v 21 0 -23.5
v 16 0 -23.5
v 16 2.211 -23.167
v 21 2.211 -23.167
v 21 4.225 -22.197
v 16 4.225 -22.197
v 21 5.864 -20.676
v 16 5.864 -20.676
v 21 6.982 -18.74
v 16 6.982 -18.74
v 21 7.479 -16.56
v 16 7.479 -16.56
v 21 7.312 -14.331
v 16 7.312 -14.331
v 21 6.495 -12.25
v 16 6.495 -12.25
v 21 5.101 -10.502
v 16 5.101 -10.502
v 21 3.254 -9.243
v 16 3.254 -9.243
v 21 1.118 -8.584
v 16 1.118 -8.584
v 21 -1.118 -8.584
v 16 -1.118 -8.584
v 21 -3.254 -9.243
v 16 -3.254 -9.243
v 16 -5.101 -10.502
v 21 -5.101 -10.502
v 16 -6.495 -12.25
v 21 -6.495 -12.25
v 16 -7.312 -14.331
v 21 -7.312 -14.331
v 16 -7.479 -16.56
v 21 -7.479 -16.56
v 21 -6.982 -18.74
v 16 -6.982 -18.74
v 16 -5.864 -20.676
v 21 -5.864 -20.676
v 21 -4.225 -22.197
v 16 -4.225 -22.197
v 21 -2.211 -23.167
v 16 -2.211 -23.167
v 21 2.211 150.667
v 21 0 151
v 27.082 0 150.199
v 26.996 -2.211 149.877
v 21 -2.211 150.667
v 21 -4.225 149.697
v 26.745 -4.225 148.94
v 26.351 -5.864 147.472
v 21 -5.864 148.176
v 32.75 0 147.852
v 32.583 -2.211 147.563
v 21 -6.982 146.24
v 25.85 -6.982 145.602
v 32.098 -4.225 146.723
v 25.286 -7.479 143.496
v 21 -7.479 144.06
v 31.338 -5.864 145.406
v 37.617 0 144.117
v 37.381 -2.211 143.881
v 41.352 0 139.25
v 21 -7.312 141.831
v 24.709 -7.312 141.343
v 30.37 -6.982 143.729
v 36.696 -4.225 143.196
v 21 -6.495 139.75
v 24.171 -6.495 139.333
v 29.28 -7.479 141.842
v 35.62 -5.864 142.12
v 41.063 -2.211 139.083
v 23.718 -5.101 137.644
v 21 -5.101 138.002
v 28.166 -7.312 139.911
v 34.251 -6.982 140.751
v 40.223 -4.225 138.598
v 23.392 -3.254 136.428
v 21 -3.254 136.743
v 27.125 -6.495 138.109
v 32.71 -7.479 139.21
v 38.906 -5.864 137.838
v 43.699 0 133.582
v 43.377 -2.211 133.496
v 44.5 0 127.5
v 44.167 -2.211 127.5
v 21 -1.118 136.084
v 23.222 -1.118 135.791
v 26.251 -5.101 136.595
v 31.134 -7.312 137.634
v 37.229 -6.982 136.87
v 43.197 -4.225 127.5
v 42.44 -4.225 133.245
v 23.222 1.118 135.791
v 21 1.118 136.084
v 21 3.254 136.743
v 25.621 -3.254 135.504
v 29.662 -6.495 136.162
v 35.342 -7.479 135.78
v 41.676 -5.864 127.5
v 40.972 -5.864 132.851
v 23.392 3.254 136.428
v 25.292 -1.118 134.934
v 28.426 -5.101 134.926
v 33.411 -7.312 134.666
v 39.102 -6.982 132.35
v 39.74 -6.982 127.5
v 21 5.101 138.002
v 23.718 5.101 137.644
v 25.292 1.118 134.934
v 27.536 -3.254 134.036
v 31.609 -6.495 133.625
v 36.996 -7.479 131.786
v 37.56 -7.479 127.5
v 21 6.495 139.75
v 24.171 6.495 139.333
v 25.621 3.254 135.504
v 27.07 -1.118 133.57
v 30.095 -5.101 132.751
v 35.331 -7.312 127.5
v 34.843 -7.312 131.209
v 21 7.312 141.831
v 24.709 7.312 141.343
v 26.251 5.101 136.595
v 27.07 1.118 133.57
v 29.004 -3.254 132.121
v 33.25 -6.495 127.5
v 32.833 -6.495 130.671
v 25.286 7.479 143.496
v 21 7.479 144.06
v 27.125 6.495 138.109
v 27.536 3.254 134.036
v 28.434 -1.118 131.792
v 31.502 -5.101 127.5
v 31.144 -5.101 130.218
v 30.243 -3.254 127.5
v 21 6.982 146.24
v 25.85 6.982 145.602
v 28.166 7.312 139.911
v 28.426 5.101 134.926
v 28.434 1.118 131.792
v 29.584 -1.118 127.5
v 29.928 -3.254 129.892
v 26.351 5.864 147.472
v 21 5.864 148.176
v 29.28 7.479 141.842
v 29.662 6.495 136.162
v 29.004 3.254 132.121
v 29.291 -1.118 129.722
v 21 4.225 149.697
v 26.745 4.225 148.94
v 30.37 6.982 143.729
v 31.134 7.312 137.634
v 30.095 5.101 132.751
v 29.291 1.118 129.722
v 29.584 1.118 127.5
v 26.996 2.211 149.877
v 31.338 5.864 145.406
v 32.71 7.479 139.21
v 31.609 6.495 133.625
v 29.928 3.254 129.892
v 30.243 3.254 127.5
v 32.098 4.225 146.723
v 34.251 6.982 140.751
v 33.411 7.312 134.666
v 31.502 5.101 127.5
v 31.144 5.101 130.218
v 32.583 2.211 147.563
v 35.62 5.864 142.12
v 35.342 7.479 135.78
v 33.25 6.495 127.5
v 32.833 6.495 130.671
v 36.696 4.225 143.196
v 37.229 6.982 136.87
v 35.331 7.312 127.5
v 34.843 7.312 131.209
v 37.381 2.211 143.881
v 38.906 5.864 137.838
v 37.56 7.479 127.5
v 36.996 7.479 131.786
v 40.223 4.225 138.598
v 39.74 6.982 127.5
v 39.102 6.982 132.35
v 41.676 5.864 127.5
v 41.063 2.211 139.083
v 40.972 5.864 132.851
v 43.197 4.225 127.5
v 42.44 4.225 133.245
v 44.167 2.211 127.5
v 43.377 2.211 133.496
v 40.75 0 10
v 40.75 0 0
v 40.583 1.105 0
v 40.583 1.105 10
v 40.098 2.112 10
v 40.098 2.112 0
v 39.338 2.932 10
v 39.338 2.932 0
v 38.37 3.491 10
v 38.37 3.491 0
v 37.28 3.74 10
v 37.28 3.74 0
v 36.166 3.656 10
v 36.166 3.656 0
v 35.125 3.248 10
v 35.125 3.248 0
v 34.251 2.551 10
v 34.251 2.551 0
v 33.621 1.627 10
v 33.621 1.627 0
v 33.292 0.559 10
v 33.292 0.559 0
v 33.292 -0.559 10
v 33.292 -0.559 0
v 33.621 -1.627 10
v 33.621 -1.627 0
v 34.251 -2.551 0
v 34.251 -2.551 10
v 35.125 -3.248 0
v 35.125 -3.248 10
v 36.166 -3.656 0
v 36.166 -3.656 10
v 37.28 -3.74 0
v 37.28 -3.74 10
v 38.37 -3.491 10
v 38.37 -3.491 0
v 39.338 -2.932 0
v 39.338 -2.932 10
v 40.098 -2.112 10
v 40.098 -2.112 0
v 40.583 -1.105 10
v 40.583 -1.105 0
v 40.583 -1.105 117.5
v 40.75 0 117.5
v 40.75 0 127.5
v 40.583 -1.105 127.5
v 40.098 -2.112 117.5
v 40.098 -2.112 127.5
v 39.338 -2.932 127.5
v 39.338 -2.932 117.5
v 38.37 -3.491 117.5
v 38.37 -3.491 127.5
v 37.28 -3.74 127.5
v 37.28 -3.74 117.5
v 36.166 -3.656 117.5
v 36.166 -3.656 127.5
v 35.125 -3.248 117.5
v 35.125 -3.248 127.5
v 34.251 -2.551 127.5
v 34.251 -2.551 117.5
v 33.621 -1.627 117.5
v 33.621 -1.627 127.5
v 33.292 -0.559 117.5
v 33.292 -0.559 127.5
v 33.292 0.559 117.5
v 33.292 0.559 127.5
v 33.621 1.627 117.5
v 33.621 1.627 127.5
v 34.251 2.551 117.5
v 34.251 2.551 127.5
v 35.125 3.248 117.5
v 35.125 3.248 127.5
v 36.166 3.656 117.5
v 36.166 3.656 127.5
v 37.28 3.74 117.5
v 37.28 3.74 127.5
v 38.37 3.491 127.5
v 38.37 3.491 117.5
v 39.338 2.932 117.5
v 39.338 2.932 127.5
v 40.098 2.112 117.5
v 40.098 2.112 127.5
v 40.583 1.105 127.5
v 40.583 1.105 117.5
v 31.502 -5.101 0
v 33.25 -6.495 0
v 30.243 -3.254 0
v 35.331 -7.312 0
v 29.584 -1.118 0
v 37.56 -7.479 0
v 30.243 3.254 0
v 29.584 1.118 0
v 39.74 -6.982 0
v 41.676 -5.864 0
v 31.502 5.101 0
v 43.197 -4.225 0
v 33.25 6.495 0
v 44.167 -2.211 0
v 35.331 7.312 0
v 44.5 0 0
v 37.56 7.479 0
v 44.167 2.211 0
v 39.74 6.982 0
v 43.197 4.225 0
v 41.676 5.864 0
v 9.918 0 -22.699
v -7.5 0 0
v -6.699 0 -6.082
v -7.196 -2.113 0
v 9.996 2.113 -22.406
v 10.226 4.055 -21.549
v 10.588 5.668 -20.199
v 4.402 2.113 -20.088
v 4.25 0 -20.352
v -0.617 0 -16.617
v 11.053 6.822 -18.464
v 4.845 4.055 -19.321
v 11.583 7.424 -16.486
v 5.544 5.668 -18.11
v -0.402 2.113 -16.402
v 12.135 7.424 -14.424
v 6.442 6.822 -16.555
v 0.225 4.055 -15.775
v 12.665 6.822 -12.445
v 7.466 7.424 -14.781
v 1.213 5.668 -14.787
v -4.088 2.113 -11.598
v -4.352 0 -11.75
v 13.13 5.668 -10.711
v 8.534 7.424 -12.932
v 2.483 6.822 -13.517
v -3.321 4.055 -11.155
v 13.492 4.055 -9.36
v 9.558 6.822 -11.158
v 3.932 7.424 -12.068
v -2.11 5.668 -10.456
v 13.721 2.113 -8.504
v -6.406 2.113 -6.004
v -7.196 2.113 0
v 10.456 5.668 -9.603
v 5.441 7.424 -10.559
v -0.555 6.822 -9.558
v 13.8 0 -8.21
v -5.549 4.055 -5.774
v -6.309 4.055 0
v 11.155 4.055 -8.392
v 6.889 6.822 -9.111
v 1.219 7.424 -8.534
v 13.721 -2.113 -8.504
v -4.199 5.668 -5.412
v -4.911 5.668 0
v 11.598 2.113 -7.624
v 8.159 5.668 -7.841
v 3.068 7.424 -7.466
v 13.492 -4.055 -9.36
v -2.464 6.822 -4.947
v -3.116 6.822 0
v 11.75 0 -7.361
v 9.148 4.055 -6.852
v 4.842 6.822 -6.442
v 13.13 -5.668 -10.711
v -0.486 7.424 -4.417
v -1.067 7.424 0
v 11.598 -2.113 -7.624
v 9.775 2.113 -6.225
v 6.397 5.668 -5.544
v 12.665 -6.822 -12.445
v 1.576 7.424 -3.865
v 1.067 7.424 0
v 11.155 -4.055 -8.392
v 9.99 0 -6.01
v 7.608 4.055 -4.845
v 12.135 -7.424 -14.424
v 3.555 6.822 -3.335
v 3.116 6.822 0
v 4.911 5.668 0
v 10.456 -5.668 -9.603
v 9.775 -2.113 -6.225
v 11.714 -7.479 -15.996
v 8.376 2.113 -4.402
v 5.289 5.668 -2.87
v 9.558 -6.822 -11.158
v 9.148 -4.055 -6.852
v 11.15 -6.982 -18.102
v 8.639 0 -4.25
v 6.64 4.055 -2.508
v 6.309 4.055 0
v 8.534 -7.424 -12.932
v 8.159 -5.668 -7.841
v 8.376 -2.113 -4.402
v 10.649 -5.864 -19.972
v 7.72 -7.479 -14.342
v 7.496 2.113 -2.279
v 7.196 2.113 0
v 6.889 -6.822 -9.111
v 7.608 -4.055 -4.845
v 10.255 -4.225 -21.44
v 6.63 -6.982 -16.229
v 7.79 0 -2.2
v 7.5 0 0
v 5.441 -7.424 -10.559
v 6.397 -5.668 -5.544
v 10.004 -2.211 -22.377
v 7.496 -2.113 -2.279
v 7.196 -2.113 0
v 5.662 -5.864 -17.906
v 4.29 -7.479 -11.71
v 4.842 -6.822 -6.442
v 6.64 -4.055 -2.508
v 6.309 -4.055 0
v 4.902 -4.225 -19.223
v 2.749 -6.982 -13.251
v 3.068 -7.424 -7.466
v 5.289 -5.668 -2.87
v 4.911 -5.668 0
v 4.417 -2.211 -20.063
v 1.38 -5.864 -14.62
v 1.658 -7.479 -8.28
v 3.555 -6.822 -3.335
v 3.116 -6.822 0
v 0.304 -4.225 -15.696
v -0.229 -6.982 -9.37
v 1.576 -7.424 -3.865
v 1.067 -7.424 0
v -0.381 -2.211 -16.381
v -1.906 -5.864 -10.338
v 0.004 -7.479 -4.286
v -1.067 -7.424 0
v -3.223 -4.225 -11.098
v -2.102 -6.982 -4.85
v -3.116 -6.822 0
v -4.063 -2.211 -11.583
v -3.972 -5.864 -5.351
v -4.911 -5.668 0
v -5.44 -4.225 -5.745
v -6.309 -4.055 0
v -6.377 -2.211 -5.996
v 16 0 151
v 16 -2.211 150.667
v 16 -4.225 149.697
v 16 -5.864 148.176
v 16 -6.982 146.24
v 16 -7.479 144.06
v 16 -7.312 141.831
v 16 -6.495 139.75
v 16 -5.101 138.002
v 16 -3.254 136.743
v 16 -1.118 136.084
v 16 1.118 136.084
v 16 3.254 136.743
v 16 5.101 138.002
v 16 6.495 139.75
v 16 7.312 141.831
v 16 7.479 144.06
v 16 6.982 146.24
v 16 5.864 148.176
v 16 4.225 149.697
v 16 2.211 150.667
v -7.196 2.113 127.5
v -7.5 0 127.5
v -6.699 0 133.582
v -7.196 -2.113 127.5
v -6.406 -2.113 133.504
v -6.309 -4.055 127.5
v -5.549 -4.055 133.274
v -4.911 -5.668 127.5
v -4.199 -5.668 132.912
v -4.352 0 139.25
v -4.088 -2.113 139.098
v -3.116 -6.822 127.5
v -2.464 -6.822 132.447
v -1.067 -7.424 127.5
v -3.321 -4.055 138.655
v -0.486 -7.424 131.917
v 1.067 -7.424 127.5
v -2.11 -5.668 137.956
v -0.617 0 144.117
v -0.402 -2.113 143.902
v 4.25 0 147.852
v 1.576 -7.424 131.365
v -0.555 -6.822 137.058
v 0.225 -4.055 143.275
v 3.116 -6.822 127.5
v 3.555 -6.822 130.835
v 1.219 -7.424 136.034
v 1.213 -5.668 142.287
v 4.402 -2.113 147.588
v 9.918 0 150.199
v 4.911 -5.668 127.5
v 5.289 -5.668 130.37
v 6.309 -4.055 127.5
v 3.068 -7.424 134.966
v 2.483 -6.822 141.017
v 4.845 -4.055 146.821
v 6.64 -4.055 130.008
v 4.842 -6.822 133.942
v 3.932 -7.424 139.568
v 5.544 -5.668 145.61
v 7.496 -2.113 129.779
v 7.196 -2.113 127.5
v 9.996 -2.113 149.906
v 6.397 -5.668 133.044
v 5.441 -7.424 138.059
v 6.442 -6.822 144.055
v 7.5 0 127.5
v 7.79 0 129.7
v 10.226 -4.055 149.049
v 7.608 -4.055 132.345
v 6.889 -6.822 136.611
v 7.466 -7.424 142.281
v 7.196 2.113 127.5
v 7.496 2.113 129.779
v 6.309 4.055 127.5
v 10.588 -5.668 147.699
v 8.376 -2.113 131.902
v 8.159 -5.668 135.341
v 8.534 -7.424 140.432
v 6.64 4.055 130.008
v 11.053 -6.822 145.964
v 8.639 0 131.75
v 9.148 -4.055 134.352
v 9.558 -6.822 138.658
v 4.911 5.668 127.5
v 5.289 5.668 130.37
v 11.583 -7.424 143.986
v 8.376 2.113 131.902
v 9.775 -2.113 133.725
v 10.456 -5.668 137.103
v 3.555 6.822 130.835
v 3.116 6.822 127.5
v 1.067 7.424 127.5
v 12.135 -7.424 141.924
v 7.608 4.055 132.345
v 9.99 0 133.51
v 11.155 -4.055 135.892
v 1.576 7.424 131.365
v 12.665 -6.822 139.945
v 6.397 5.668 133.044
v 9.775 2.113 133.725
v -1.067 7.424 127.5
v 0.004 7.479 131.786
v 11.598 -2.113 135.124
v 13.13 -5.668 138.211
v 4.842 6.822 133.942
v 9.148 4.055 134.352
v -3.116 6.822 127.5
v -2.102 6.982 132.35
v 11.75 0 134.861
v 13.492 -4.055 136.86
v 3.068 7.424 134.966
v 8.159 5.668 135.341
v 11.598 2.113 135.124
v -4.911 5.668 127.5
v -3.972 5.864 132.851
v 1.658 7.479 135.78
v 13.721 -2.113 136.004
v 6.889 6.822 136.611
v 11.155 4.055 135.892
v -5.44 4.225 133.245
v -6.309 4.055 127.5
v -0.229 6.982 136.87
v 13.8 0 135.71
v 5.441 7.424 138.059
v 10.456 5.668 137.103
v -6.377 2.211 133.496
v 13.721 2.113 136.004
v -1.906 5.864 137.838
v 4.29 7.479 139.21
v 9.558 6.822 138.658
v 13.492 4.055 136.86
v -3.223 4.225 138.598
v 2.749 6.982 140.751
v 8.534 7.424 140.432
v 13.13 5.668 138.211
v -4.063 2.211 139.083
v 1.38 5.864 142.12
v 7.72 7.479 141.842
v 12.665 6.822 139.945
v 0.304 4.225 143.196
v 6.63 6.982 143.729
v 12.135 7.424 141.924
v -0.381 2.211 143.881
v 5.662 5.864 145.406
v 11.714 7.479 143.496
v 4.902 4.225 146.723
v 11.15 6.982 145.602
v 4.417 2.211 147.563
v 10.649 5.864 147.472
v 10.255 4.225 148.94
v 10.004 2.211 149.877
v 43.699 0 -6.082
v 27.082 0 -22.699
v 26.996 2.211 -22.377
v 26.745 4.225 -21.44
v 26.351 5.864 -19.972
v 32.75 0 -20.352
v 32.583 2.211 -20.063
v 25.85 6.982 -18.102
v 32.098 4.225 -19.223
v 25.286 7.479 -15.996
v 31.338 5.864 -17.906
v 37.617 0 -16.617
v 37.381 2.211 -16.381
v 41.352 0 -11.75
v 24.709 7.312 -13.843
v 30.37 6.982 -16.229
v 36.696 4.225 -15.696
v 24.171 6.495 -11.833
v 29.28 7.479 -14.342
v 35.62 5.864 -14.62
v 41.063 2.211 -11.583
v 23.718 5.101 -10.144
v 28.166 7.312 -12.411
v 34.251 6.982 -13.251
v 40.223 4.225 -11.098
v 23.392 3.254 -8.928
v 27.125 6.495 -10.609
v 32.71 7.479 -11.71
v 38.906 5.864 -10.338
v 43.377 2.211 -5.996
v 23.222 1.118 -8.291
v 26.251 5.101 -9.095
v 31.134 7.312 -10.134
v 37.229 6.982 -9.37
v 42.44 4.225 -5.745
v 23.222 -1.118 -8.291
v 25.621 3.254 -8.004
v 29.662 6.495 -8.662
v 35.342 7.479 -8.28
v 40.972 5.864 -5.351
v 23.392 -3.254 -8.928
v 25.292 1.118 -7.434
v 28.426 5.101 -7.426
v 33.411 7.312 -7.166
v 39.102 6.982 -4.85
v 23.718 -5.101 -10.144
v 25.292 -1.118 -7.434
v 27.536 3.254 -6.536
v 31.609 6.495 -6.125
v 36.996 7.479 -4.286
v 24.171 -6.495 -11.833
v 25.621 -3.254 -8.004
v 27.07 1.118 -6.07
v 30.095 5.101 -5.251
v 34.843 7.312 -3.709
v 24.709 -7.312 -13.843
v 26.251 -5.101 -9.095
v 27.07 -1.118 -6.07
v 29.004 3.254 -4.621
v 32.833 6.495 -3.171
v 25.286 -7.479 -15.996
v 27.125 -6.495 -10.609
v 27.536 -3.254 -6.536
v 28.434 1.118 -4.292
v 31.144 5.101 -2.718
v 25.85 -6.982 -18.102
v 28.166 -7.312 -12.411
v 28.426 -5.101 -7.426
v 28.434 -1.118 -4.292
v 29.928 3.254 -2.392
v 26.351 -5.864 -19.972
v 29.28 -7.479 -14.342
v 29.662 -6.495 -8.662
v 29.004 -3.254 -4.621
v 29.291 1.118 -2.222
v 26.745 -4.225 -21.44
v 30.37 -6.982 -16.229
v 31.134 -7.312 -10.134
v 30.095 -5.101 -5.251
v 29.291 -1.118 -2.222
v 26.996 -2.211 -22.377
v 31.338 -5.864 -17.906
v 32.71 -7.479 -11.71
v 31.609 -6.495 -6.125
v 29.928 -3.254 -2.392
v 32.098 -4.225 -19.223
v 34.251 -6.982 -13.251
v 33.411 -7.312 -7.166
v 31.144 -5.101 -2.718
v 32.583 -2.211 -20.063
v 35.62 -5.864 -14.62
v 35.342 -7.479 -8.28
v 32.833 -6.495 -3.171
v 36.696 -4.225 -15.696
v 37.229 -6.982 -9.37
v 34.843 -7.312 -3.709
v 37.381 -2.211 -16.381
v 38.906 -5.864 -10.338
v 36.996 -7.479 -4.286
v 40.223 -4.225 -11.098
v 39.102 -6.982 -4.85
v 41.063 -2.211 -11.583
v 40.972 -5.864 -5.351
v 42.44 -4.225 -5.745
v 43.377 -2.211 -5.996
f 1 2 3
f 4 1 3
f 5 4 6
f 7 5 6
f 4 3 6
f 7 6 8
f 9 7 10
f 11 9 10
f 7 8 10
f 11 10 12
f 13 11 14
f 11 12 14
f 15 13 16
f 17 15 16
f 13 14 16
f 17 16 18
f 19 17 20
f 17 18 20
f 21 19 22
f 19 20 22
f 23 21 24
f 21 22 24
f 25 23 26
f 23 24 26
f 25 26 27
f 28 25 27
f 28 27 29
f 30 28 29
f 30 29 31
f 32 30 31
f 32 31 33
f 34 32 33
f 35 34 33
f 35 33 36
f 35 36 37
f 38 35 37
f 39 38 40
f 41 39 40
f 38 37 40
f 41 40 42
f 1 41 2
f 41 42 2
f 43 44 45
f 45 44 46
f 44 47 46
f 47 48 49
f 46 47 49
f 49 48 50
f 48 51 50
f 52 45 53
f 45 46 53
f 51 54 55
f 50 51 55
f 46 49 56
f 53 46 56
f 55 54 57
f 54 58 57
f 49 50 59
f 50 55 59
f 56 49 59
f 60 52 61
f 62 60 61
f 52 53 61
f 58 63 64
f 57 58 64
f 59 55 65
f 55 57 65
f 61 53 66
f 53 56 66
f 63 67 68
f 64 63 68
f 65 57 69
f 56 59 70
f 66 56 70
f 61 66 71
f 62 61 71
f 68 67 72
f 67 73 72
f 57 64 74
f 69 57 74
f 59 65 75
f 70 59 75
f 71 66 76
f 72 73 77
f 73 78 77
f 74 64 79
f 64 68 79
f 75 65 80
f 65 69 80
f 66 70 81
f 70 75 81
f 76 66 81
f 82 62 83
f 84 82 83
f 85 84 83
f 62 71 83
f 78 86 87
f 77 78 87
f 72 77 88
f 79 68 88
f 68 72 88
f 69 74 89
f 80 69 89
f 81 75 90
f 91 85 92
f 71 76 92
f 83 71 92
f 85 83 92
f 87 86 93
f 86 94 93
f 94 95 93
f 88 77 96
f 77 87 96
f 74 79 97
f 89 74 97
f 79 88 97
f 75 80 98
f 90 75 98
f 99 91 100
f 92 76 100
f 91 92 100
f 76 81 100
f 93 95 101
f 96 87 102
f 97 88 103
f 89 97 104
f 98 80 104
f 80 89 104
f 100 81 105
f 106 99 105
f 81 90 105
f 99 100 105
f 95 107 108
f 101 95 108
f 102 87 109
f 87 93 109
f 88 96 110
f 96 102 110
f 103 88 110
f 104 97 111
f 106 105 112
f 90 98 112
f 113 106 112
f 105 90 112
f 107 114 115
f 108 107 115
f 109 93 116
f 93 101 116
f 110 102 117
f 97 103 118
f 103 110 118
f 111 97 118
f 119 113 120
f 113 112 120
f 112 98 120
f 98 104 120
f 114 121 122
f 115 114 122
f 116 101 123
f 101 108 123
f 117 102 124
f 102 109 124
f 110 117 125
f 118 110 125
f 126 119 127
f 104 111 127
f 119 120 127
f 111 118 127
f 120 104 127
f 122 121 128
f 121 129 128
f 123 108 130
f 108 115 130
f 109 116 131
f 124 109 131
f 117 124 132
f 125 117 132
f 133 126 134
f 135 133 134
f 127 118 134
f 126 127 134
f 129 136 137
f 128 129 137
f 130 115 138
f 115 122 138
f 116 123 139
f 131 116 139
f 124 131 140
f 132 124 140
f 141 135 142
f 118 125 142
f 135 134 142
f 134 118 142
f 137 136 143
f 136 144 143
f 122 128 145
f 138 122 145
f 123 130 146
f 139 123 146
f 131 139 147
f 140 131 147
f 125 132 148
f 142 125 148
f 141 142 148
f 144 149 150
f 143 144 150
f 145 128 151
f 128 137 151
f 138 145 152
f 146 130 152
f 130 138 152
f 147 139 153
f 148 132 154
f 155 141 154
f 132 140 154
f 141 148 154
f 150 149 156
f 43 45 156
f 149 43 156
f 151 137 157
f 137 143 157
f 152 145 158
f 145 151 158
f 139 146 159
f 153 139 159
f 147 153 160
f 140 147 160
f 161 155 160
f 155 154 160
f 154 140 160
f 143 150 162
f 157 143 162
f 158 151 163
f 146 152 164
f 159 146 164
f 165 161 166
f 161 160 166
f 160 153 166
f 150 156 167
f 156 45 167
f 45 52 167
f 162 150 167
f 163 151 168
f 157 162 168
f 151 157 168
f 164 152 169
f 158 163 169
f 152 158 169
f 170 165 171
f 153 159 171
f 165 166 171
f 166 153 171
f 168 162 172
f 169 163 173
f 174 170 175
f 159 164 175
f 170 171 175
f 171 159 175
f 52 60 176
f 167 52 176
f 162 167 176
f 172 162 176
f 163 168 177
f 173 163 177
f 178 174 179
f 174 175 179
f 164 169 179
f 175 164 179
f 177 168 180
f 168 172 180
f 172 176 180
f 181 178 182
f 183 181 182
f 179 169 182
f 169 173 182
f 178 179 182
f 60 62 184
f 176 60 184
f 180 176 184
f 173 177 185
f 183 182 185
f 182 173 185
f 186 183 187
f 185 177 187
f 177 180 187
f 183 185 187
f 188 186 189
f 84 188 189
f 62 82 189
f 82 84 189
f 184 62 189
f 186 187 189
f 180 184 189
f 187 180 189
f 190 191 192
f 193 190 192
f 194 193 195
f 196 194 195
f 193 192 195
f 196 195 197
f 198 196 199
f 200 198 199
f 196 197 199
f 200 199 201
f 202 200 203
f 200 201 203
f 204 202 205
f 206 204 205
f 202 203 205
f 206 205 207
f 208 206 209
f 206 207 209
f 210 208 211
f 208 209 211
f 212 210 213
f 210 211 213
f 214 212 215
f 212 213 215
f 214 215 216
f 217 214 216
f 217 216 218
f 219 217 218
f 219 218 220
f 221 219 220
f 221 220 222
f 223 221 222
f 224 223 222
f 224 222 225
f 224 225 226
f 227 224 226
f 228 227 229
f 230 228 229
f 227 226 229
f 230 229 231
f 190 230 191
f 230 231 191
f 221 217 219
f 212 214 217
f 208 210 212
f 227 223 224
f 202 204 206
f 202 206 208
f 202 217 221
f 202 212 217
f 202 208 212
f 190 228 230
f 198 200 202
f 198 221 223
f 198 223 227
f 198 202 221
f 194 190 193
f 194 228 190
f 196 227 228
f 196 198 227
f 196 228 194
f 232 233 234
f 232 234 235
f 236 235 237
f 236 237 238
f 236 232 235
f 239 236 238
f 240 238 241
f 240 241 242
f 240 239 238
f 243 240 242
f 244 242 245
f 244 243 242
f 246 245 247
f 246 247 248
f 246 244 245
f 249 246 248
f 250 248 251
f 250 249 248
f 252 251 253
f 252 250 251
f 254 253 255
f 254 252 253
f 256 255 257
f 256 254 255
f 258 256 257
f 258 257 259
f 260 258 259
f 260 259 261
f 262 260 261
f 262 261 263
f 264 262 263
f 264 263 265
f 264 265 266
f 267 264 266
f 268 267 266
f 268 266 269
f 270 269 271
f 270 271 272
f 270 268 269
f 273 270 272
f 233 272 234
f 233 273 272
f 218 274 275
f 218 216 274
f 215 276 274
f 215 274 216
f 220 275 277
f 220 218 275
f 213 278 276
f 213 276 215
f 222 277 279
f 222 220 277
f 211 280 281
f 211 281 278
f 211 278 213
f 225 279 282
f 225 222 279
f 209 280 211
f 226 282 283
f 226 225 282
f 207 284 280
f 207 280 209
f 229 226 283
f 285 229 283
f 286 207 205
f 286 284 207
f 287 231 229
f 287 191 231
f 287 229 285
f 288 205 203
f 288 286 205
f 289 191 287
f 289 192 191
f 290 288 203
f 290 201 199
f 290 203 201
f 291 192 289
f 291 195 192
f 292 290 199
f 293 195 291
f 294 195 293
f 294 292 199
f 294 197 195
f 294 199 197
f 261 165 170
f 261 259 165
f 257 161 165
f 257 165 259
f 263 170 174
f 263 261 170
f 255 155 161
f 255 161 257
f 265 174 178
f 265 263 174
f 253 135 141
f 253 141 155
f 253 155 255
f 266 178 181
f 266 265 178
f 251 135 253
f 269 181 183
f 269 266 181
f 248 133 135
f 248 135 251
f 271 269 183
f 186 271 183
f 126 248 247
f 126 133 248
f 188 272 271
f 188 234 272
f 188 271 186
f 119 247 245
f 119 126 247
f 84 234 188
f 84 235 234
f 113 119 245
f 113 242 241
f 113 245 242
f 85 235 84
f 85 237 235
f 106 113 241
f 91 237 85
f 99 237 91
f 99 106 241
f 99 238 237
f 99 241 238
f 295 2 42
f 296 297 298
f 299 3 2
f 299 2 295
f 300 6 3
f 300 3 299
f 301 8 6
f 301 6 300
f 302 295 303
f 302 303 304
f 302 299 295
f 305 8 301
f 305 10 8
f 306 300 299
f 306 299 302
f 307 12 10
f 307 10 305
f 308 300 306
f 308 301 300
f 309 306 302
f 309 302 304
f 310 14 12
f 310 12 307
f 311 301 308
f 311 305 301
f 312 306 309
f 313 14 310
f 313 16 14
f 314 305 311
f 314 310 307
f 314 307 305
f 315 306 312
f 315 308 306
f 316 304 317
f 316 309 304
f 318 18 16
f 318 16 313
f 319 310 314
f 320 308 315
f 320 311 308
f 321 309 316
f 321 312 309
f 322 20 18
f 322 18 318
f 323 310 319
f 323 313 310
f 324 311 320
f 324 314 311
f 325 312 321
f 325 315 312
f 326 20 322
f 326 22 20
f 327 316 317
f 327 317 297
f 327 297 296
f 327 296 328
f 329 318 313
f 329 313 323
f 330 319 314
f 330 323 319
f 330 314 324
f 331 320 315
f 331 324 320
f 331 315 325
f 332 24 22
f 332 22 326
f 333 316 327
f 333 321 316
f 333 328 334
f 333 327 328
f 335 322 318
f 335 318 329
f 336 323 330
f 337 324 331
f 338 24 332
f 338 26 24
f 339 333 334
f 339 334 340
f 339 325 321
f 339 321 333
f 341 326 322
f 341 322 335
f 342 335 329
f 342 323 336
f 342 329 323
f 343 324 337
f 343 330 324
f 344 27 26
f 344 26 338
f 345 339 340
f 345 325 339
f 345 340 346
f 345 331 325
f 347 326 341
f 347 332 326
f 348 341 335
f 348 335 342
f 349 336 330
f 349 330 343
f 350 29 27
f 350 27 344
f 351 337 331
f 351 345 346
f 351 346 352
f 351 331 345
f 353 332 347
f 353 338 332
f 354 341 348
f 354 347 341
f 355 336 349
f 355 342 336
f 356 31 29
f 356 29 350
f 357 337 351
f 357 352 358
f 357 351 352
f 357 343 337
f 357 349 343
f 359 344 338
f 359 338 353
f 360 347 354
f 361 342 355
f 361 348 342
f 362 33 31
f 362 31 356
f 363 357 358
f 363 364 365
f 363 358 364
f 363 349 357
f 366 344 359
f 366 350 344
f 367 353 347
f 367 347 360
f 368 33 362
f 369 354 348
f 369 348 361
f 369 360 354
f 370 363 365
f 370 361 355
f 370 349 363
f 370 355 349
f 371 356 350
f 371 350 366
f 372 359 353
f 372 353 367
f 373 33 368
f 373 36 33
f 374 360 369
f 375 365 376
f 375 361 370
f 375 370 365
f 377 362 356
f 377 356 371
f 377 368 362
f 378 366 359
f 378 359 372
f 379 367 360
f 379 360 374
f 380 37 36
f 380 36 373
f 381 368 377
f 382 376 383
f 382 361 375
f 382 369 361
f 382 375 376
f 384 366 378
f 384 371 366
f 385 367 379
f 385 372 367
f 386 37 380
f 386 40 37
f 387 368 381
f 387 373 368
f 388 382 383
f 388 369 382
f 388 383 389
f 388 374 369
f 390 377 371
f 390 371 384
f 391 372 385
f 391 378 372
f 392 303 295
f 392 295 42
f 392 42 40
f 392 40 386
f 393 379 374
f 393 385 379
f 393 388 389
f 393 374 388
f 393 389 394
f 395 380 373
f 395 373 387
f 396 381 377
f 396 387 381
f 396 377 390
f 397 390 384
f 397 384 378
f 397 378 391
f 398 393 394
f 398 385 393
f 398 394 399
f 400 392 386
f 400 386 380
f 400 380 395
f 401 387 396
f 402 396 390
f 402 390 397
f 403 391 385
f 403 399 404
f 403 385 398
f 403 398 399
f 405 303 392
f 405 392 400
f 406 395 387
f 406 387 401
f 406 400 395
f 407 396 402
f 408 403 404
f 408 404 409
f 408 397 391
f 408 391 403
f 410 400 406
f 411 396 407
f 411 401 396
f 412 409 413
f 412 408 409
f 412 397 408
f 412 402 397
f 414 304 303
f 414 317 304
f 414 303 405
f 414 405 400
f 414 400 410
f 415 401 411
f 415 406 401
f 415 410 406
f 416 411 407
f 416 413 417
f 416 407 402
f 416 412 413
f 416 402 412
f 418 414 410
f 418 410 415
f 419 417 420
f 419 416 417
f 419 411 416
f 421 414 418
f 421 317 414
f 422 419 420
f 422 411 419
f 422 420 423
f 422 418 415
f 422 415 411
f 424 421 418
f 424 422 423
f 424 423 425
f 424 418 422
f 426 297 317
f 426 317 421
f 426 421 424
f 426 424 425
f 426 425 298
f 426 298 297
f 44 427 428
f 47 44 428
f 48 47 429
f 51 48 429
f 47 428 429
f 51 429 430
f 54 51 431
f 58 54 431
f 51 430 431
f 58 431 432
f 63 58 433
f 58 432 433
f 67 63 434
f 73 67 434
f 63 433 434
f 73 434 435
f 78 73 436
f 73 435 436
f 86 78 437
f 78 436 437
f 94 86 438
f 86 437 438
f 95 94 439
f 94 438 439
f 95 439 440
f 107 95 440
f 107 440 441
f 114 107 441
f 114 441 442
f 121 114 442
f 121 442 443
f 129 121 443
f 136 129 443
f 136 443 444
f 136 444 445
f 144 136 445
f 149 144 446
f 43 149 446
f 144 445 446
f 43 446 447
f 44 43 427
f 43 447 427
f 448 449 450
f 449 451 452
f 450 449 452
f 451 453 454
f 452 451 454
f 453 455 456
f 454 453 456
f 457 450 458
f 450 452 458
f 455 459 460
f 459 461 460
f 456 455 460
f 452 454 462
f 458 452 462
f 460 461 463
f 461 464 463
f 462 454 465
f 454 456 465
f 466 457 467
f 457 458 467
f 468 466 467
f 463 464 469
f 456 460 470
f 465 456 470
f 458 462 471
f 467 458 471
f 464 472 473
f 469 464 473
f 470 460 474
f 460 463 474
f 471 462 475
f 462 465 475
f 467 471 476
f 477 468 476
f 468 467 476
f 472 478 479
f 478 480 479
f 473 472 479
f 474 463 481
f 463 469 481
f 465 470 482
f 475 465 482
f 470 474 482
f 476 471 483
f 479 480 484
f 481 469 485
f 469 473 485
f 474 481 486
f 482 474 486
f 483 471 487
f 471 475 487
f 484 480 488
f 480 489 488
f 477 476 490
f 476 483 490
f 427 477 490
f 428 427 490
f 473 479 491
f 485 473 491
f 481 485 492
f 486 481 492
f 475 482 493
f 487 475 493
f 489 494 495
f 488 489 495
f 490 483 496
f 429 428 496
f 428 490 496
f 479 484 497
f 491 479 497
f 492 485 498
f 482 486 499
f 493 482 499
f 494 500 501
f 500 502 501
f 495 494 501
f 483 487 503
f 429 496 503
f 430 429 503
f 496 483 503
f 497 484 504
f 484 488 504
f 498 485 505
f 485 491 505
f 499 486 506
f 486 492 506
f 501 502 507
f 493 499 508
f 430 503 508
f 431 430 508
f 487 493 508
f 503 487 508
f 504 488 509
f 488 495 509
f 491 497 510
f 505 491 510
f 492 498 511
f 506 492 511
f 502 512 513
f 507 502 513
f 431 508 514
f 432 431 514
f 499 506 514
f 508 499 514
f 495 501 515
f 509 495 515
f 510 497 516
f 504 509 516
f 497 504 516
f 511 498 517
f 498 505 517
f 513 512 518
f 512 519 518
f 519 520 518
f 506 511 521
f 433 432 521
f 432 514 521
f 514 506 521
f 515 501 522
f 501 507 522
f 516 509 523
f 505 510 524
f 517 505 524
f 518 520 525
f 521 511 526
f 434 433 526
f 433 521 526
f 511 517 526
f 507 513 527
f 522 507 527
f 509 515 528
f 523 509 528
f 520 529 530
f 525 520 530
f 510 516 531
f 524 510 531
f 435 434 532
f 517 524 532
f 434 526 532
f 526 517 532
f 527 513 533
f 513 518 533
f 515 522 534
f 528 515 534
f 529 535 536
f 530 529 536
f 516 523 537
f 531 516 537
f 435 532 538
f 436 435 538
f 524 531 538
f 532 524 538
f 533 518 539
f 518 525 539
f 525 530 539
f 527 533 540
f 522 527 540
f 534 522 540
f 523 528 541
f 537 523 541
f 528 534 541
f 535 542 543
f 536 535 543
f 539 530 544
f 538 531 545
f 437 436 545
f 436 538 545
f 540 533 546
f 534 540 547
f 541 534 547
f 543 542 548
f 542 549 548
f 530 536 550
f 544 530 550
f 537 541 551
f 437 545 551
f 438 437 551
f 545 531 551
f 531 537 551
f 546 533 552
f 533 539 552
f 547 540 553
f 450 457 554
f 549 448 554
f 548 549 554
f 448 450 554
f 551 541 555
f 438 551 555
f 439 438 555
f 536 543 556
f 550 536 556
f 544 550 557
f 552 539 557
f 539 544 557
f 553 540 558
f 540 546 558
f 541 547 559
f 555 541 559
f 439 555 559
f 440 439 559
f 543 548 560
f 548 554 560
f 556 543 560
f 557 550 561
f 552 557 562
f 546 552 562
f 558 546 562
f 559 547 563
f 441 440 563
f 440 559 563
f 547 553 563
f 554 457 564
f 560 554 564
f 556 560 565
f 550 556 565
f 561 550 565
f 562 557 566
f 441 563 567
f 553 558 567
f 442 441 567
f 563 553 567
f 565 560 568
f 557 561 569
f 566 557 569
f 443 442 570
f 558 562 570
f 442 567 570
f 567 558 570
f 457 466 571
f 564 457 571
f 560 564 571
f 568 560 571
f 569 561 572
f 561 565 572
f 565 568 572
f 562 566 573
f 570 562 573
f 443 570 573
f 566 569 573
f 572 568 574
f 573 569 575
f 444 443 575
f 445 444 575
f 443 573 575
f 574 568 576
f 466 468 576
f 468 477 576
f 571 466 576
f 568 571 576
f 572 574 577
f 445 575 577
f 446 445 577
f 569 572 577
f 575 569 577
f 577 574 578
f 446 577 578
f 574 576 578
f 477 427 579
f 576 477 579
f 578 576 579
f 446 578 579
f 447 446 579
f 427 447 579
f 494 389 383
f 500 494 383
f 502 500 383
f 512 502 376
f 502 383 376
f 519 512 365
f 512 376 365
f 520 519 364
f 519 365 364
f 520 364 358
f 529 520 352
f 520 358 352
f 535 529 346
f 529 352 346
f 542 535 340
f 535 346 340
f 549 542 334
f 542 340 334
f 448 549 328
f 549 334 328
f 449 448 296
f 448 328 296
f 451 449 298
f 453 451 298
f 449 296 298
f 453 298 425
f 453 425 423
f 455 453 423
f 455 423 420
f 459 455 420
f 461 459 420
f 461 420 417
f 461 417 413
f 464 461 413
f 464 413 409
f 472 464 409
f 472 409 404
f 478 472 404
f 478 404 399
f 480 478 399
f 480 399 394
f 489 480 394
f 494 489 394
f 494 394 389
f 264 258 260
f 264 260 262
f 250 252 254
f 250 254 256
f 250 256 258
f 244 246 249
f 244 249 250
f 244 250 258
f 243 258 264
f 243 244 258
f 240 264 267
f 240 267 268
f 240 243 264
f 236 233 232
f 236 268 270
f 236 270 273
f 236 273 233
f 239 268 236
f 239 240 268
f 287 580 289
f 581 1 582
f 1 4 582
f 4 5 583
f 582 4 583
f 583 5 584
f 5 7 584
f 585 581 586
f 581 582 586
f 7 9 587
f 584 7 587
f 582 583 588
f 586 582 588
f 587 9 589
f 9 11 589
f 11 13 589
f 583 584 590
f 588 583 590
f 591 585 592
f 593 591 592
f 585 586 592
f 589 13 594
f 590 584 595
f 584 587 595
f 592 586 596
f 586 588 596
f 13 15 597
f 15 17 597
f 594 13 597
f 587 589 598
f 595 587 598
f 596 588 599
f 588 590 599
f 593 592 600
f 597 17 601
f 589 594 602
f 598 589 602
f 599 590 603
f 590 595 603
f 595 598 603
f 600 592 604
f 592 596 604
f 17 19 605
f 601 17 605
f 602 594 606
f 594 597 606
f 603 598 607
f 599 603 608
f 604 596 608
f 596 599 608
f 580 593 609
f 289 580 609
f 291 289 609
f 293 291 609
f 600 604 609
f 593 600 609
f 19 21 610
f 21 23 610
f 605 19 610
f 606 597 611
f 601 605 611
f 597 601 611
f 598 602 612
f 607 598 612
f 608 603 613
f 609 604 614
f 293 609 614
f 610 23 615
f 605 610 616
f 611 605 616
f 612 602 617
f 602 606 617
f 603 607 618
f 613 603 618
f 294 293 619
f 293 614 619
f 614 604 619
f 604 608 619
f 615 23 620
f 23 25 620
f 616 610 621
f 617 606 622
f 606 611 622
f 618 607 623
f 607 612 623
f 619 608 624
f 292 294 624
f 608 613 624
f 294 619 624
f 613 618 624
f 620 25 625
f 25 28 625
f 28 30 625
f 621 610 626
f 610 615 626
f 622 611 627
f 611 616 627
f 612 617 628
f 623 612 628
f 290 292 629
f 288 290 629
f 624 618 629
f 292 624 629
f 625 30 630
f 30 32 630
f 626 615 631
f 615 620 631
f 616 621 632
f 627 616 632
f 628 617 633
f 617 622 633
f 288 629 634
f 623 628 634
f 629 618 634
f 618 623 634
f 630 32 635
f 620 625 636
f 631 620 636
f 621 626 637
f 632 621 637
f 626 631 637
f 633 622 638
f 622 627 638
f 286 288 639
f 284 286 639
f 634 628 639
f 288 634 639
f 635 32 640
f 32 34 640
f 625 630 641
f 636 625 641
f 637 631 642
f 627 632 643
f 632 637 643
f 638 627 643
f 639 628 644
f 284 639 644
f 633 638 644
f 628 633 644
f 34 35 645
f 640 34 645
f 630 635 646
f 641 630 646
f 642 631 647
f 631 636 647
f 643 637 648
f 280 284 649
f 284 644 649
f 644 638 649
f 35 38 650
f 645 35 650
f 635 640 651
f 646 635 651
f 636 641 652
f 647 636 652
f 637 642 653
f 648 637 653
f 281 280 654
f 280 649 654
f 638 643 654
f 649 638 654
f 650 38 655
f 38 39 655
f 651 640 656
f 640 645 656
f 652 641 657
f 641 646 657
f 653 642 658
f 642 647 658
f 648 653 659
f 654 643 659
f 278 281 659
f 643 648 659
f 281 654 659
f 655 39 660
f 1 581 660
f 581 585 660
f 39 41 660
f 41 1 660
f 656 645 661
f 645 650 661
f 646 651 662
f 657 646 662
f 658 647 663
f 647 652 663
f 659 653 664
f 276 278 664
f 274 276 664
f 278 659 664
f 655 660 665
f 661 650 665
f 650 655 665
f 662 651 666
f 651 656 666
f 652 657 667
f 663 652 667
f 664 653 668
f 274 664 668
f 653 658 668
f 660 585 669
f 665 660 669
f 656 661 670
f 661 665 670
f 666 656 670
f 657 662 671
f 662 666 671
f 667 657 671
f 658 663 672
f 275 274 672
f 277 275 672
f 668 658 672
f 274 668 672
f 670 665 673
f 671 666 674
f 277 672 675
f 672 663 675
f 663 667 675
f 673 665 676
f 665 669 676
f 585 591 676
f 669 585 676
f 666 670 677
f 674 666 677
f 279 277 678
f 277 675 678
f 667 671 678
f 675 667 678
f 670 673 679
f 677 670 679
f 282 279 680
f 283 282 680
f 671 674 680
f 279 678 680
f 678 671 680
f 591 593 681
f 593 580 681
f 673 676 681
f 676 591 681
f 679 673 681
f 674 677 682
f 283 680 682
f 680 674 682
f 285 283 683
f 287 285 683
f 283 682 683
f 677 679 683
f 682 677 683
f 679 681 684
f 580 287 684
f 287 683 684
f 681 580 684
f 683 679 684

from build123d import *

# Parameters (mm, degrees)
SKETCH_2_R          = 7.5
EXTRUDE_1_DEPTH     = 127.5
SKETCH_3_R          = 7.5
REVOLVE_1_ANGLE     = 90
REVOLVE_2_OUTLINE_R = 7.5
REVOLVE_2_ANGLE     = 90
SKETCH_19_R         = 7.5
EXTRUDE_2_DEPTH     = 5
SKETCH_21_R         = 7.5
EXTRUDE_3_DEPTH     = 5
SKETCH_22_R         = 7.5
REVOLVE_3_ANGLE     = 90
SKETCH_23_R         = 7.5
REVOLVE_4_ANGLE     = 90
SKETCH_25_R         = 3.75
EXTRUDE_4_DEPTH     = 10
EXTRUDE_START       = 10
SKETCH_26_R         = 3.75
EXTRUDE_5_DEPTH     = 10


# Read off the part's stored shape, not the designer's step: Повернуть2
with BuildPart() as part:
    # Эскиз2 → Бобышка-Вытянуть1 (new body)
    with BuildSketch(Plane.XY):
        Circle(SKETCH_2_R)
    extrude(amount=EXTRUDE_1_DEPTH)

    # Эскиз3 → Повернуть1 (revolve)
    with BuildSketch(Plane.XY.offset(127.5)):
        with Locations(Location((0, 0, 0), (0, 0, 180))):
            Circle(SKETCH_3_R)
    revolve(axis=Axis((16, 0, 127.5), (0, 1, 0)), revolution_arc=REVOLVE_1_ANGLE)

    # Повернуть2 outline → Повернуть2 (revolve)
    with BuildSketch(Plane(origin=(16, 0, 0), x_dir=(0, 0, -1), z_dir=(1, 0, 0))):
        with Locations((16, 0)):
            Circle(REVOLVE_2_OUTLINE_R)
    revolve(axis=Axis((16, 0, 0), (0, 1, 0)), revolution_arc=REVOLVE_2_ANGLE)

    # Эскиз19 → Бобышка-Вытянуть2 (add)
    with BuildSketch(Plane(origin=(16, 0, 0), x_dir=(0, 0, -1), z_dir=(1, 0, 0))):
        with Locations((16, 0)):
            Circle(SKETCH_19_R)
    extrude(amount=EXTRUDE_2_DEPTH)

    # Эскиз21 → Бобышка-Вытянуть3 (add)
    with BuildSketch(Plane(origin=(16, 0, 0), x_dir=(0, 0, -1), z_dir=(1, 0, 0))):
        with Locations(Location((-143.5, 0, 0), (0, 0, 180))):
            Circle(SKETCH_21_R)
    extrude(amount=EXTRUDE_3_DEPTH)

    # Эскиз22 → Повернуть3 (revolve)
    with BuildSketch(Plane(origin=(21, 0, 0), x_dir=(0, 0, -1), z_dir=(1, 0, 0))):
        with Locations((16, 0)):
            Circle(SKETCH_22_R)
    revolve(axis=Axis((21, 0, 0), (0, -1, 0)), revolution_arc=REVOLVE_3_ANGLE)

    # Эскиз23 → Повернуть4 (revolve)
    with BuildSketch(Plane(origin=(21, 0, 0), x_dir=(0, 0, -1), z_dir=(1, 0, 0))):
        with Locations(Location((-143.5, 0, 0), (0, 0, 180))):
            Circle(SKETCH_23_R)
    revolve(axis=Axis((21, 0, 127.5), (0, 1, 0)), revolution_arc=REVOLVE_4_ANGLE)

    # Эскиз25 → Бобышка-Вытянуть4 (add)
    with BuildSketch(Plane.XY):
        with Locations((37, 0)):
            Circle(SKETCH_25_R)
    extrude(amount=EXTRUDE_4_DEPTH)

    # Эскиз26 → Бобышка-Вытянуть5 (add)
    with BuildSketch(Plane(origin=(0, 0, 127.5), x_dir=(-1, 0, 0), z_dir=(0, 0, -1)).offset(EXTRUDE_START)):
        with Locations(Location((-37, 0, 0), (0, 0, 180))):
            Circle(SKETCH_26_R)
    extrude(amount=-EXTRUDE_5_DEPTH)


solid = part.part
